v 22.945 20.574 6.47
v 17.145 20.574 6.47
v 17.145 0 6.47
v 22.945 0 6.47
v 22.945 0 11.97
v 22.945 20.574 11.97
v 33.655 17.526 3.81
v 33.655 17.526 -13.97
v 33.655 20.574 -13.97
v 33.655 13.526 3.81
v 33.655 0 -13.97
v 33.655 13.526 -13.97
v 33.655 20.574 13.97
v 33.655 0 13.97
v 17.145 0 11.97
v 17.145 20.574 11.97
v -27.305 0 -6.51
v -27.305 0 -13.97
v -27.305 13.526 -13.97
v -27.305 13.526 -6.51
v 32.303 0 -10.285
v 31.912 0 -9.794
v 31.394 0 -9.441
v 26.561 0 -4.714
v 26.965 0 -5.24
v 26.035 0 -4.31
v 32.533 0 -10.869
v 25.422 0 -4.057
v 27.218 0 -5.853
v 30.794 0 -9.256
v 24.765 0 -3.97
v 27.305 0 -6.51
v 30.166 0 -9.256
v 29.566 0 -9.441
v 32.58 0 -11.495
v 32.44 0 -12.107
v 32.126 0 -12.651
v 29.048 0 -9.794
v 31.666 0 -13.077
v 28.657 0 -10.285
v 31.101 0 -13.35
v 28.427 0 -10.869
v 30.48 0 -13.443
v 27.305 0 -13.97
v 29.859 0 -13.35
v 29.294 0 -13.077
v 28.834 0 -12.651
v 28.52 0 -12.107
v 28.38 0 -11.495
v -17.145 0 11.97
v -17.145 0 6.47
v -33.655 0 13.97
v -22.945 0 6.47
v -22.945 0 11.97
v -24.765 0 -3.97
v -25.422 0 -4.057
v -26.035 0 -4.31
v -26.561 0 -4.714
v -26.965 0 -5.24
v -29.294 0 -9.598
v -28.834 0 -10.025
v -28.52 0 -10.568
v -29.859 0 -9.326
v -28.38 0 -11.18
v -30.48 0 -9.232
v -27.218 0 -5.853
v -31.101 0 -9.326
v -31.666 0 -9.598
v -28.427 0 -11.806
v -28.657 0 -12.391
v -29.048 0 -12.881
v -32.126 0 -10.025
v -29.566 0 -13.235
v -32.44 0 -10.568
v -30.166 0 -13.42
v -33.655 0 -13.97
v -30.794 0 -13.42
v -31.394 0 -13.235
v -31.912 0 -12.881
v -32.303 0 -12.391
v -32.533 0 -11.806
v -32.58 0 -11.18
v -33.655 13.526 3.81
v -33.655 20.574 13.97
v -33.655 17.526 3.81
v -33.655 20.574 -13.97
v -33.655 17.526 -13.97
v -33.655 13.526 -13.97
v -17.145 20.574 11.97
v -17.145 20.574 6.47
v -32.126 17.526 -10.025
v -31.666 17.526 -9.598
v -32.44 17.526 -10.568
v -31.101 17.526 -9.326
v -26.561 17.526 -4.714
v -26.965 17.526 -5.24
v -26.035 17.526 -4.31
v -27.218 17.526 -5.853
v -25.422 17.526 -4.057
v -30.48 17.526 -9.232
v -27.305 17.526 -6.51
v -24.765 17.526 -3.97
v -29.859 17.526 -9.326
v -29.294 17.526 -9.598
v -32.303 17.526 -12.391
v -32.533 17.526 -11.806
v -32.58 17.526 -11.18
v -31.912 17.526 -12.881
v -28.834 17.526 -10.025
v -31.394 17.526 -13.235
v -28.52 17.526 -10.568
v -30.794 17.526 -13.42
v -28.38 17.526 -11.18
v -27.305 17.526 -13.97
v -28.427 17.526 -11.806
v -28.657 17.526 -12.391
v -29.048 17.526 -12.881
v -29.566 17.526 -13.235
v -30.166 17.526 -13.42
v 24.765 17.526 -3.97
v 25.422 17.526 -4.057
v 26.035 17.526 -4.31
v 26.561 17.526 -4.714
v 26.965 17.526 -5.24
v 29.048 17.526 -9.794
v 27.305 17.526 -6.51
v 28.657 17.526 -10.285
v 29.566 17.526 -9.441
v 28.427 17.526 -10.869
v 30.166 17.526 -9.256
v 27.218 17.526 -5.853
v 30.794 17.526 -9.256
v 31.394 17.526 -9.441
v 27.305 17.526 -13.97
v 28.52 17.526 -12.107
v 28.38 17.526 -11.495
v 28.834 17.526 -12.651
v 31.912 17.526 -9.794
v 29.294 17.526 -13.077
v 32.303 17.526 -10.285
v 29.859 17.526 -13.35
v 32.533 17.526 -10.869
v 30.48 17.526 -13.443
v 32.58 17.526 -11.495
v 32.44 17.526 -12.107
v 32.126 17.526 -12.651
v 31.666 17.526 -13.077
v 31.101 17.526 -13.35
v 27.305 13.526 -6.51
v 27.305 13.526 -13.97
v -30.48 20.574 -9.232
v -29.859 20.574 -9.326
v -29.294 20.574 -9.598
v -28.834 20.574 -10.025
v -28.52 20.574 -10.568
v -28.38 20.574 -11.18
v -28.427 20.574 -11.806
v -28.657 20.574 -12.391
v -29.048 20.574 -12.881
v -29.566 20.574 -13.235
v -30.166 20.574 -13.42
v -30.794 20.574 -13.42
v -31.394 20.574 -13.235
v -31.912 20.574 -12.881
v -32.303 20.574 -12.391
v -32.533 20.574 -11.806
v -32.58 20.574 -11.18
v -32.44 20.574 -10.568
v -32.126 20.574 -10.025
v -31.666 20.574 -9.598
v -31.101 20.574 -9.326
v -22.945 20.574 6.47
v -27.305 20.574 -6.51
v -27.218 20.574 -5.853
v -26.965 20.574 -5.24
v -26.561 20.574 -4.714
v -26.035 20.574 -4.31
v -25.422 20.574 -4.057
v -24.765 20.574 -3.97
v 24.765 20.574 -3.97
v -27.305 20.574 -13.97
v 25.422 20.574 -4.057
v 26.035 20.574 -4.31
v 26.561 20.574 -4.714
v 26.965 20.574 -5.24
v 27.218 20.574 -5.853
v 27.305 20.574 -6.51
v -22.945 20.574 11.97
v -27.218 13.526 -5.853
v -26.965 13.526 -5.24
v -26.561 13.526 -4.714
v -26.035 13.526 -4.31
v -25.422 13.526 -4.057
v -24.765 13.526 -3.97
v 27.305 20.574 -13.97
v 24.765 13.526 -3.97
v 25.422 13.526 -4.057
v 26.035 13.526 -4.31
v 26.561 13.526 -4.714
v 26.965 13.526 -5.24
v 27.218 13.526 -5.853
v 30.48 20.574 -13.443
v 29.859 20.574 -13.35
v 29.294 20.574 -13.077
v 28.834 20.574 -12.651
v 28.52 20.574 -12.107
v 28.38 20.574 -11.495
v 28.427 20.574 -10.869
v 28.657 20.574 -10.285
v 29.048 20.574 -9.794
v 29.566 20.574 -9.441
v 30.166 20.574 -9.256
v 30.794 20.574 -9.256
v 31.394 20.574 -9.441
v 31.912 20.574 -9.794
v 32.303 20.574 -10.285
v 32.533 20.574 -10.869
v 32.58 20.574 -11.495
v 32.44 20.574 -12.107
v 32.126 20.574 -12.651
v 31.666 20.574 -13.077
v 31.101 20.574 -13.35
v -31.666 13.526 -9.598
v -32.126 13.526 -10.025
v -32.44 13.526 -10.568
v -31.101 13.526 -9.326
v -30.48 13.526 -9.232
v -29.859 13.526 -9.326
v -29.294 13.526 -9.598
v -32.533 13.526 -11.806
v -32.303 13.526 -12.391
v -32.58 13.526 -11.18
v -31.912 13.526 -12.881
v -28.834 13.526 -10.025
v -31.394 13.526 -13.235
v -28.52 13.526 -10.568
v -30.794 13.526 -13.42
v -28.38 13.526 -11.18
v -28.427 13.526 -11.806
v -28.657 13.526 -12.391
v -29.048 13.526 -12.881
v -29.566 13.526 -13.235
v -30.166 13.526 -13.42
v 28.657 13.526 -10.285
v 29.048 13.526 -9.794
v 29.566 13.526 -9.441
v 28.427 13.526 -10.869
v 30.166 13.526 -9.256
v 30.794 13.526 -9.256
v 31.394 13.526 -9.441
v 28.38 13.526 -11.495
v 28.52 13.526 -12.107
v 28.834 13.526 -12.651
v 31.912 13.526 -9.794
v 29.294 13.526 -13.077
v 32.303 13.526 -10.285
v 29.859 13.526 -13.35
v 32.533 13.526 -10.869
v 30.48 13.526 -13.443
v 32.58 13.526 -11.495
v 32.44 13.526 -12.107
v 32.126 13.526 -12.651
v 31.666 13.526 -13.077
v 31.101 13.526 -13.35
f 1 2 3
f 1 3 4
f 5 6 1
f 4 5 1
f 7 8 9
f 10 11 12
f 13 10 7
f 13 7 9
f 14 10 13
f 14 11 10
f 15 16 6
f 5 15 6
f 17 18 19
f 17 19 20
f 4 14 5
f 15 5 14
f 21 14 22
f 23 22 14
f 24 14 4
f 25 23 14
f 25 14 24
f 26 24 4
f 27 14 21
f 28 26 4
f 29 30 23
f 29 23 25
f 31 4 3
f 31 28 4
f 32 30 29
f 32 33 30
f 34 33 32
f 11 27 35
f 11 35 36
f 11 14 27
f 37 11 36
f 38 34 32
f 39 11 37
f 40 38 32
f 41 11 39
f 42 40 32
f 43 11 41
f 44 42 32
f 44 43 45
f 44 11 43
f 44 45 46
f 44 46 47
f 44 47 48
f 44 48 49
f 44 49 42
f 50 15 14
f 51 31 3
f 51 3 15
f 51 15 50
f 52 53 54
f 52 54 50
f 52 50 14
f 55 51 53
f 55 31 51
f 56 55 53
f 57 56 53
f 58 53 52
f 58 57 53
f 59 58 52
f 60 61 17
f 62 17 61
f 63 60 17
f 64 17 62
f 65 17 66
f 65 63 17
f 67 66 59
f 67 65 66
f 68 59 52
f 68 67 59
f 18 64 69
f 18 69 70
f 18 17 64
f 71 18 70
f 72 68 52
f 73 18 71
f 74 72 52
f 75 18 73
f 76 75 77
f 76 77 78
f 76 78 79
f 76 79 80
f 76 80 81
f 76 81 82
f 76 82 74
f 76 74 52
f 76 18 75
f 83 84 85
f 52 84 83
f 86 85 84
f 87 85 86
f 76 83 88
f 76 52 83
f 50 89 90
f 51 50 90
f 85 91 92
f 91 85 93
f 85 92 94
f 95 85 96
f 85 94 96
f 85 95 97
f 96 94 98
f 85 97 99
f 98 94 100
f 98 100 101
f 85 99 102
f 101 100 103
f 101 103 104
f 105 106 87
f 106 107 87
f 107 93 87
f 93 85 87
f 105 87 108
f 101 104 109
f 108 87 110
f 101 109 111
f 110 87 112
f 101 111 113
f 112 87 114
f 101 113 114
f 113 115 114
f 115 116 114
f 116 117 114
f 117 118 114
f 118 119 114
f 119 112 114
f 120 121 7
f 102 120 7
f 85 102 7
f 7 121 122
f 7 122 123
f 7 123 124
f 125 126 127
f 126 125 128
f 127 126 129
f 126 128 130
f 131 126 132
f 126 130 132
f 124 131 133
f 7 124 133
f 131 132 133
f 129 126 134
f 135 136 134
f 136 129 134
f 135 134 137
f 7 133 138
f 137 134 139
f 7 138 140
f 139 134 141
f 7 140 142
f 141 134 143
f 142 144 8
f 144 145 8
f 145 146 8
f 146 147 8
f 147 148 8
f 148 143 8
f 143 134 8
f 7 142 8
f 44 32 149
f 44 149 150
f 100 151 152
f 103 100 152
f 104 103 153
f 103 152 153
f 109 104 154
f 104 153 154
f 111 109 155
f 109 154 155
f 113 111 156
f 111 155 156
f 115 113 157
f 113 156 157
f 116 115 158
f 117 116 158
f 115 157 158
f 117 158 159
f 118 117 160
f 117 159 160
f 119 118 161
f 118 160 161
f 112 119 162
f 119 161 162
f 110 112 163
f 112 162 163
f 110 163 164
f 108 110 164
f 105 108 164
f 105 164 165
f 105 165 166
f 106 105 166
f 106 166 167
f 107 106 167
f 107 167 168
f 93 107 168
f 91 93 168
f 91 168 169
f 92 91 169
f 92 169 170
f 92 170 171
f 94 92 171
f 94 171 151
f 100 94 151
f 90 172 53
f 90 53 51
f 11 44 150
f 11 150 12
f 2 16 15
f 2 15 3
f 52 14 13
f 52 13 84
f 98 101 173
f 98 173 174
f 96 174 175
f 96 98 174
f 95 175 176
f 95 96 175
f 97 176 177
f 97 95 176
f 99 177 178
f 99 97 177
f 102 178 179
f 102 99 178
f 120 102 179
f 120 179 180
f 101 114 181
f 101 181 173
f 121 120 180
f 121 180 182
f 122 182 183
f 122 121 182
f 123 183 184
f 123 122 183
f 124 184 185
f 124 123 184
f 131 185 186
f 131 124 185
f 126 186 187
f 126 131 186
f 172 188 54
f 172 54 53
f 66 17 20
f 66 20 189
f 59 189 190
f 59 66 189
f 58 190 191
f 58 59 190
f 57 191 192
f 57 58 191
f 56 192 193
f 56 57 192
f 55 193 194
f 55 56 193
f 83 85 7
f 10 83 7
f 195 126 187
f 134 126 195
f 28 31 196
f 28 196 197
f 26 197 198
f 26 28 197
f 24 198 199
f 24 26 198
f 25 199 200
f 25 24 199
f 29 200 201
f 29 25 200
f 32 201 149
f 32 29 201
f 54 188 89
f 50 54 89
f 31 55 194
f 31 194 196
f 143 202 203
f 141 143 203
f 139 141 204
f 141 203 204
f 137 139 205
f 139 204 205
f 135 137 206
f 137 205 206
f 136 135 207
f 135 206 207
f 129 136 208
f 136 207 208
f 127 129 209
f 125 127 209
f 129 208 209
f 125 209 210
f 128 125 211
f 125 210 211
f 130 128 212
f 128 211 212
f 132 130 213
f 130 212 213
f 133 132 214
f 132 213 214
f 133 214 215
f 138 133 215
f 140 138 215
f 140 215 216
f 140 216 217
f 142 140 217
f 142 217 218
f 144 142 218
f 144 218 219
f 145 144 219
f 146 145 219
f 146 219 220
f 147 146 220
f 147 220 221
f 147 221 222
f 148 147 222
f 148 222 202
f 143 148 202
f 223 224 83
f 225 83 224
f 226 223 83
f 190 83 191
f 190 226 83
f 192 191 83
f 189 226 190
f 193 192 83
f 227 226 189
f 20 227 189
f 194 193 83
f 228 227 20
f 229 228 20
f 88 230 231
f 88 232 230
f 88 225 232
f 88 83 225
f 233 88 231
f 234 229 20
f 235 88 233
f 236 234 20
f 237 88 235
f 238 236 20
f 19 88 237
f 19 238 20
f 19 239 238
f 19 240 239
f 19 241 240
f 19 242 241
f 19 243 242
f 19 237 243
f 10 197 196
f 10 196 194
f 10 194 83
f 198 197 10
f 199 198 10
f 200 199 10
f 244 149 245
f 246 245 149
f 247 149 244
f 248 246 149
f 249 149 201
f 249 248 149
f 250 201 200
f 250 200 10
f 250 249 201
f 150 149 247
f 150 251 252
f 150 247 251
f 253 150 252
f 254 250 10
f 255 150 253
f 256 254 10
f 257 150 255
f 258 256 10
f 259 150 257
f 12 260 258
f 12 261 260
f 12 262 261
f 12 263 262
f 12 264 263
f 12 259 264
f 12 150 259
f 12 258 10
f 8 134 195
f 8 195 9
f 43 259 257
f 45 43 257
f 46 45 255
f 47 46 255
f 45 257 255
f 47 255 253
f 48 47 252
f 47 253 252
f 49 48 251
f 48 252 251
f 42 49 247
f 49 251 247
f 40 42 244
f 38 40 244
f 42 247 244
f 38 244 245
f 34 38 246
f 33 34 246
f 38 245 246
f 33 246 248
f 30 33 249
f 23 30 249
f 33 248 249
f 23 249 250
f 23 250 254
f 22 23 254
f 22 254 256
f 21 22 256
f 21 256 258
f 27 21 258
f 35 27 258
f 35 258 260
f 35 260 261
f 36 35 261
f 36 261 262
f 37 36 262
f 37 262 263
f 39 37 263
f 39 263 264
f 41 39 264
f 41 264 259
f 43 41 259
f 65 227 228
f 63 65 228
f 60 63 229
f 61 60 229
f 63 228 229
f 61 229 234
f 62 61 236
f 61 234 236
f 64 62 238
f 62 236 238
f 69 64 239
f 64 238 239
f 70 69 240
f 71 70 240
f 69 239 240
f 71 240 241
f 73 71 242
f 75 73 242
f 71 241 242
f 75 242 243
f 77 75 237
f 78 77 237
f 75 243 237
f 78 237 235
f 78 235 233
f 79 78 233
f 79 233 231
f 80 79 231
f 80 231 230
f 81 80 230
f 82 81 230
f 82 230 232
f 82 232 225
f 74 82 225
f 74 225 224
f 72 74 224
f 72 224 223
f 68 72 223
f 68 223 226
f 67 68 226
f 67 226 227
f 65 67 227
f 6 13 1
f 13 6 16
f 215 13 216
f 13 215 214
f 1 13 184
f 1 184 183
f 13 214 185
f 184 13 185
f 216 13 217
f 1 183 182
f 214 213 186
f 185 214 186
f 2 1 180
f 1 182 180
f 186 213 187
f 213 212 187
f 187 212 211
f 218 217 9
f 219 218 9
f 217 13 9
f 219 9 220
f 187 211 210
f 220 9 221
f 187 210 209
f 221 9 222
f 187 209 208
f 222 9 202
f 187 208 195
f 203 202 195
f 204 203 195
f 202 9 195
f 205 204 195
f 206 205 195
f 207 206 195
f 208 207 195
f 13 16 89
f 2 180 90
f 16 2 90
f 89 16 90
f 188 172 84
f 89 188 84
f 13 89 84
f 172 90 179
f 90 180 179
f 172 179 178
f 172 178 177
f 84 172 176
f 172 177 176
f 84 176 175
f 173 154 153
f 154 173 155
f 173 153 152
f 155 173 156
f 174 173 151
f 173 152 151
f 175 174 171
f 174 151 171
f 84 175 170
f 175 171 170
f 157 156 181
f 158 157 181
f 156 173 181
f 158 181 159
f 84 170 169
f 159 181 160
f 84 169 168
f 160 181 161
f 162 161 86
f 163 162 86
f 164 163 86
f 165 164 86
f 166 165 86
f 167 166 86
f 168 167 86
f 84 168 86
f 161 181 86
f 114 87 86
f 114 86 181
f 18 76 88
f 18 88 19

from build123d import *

# Parameters (mm, degrees)
BOSS_EXTRUDE1_DEPTH     = 20.574
CUT_EXTRUDE1_DEPTH      = 3.81
CUT_EXTRUDE1_DEPTH_BACK = 14.224
SKETCH3_W               = 67.31
SKETCH3_H               = 4
SKETCH4_R               = 2.105577283
CUT_EXTRUDE2_DEPTH      = 42.846259104
SKETCH6_W               = 5.8
SKETCH6_H               = 5.5
CUT_EXTRUDE3_DEPTH      = 42.846259104


with BuildPart() as part:
    # Sketch2 → Boss-Extrude1 (new body)
    with BuildSketch(Plane(origin=(0, 0, 0), x_dir=(1, 0, 0), z_dir=(0, 1, 0))):
        with BuildLine():
            Line((-33.655, 13.97), (-27.305, 13.97))
            Line((-27.305, 13.97), (-27.305, 6.51))
            ThreePointArc((-27.305, 6.51), (-26.561051224, 4.713948776), (-24.765, 3.97))
            Line((-24.765, 3.97), (24.765, 3.97))
            ThreePointArc((24.765, 3.97), (26.561051224, 4.713948776), (27.305, 6.51))
            Line((27.305, 6.51), (27.305, 13.97))
            Line((27.305, 13.97), (33.655, 13.97))
            Line((33.655, 13.97), (33.655, -13.97))
            Line((33.655, -13.97), (-33.655, -13.97))
            Line((-33.655, -13.97), (-33.655, 13.97))
        make_face()
    extrude(amount=BOSS_EXTRUDE1_DEPTH)

    # Sketch3 → Cut-Extrude1 (cut, two sides: drawn at the far end of the back side and taken through both)
    with BuildSketch(Plane.XY.offset(-CUT_EXTRUDE1_DEPTH_BACK)):
        with Locations((0, 15.526)):
            Rectangle(SKETCH3_W, SKETCH3_H)
    extrude(amount=CUT_EXTRUDE1_DEPTH + CUT_EXTRUDE1_DEPTH_BACK, mode=Mode.SUBTRACT)

    # Sketch4 → Cut-Extrude2 (cut, through all)
    with BuildSketch(Plane(origin=(0, 20.574, 0), x_dir=(1, 0, 0), z_dir=(0, 1, 0))):
        with Locations(Location((-30.48, 11.337723829, 0), (0, 0, 270))):
            Circle(SKETCH4_R)
        with Locations(Location((30.48, 11.337723829, 0), (0, 0, 90))):
            Circle(SKETCH4_R)
    extrude(amount=-CUT_EXTRUDE2_DEPTH, mode=Mode.SUBTRACT)

    # Sketch6 → Cut-Extrude3 (cut, through all)
    with BuildSketch(Plane(origin=(0, 20.574, 0), x_dir=(1, 0, 0), z_dir=(0, 1, 0))):
        with Locations((20.045, -9.22)):
            Rectangle(SKETCH6_W, SKETCH6_H)
        with Locations((-20.045, -9.22)):
            Rectangle(SKETCH6_W, SKETCH6_H)
    extrude(amount=-CUT_EXTRUDE3_DEPTH, mode=Mode.SUBTRACT)


solid = part.part
